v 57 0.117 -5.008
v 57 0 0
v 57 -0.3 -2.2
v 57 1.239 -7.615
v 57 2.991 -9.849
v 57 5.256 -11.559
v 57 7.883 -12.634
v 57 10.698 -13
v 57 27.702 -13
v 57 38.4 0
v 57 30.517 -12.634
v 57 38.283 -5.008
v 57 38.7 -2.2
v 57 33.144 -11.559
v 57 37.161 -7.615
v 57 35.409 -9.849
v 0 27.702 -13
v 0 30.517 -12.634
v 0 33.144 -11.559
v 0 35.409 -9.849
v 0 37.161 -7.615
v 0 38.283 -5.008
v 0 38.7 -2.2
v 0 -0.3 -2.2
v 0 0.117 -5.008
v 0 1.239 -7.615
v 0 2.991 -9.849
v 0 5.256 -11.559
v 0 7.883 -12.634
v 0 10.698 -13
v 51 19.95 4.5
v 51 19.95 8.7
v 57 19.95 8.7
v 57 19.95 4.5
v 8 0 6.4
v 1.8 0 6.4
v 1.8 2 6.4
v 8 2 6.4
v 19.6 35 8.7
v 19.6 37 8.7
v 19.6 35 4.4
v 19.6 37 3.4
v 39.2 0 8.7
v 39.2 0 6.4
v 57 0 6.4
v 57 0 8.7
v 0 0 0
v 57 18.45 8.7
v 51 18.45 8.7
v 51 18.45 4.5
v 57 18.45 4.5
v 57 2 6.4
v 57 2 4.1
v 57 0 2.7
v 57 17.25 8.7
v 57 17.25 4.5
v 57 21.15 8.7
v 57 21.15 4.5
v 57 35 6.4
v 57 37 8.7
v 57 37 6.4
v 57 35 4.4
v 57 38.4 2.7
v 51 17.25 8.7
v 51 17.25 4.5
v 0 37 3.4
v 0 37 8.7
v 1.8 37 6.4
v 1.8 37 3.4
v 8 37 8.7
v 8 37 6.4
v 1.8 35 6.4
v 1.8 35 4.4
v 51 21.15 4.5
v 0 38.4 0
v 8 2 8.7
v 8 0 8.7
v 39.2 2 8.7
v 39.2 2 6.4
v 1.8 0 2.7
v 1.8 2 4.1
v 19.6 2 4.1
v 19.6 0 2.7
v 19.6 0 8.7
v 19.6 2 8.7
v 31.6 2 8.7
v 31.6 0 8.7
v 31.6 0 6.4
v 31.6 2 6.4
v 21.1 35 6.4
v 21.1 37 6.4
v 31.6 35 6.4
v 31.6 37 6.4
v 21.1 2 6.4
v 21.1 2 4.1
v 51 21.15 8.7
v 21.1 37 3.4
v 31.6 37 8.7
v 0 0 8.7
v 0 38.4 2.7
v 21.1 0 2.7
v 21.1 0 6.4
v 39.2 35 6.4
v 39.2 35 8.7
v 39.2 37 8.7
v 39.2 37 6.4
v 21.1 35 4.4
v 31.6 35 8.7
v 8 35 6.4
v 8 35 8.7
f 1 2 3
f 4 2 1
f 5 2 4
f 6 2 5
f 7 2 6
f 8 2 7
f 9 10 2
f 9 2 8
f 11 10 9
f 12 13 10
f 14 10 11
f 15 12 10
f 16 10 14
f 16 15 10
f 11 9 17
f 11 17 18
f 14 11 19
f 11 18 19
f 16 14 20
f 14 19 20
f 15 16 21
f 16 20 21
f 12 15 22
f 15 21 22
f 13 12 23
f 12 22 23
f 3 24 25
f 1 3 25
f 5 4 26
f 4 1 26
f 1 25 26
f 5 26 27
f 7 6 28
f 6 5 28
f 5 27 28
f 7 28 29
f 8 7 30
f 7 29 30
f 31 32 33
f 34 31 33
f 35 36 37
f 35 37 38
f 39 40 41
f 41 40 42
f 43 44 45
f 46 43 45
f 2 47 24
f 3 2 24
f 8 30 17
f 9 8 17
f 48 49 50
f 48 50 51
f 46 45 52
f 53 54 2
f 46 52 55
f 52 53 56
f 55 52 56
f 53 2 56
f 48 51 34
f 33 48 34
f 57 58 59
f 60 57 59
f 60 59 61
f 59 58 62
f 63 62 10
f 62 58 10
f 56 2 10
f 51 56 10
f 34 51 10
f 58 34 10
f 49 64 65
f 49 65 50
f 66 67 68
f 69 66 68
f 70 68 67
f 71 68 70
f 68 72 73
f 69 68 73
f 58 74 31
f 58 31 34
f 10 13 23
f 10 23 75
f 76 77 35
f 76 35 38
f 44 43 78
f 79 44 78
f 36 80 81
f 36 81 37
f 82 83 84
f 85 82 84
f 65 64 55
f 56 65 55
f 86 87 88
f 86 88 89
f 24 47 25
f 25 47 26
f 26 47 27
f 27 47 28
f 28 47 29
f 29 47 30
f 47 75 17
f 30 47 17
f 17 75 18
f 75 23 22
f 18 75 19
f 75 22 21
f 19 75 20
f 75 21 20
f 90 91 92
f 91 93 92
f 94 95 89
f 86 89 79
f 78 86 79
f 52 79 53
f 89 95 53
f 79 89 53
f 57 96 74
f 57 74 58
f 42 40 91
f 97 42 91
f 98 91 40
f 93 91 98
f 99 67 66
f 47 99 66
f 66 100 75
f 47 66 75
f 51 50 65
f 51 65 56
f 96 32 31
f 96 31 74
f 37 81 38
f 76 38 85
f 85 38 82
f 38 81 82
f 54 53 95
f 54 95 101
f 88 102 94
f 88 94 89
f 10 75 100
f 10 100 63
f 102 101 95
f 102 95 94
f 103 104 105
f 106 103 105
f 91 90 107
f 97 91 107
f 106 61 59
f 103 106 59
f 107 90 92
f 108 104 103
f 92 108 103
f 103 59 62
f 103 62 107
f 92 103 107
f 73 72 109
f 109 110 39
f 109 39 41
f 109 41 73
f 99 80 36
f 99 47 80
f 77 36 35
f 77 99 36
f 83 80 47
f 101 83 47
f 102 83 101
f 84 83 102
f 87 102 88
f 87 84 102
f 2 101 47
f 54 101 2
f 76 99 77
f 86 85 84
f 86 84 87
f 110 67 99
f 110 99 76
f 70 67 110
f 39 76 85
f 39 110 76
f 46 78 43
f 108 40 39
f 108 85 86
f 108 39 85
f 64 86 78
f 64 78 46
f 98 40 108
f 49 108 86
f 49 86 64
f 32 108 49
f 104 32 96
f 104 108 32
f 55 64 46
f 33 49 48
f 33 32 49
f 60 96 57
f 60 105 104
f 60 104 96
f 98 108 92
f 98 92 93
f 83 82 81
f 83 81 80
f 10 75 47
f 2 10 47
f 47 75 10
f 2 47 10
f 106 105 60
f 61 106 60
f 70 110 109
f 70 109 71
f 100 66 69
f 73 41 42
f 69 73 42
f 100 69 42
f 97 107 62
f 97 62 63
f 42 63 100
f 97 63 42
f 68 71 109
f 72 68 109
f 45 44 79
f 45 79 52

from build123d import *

# Parameters (mm, degrees)
SKETCH_1_W          = 57
SKETCH_1_H          = 38.4
EXTRUDE_1_DEPTH     = 8.7
SKETCH_2_W          = 57
SKETCH_2_H          = 1.4
CUT_EXTRUDE_1_DEPTH = 2.3
SKETCH_3_W          = 57
SKETCH_3_H          = 2.3
CUT_EXTRUDE_2_DEPTH = 2
SKETCH_4_W          = 11.6
SKETCH_4_H          = 2
SKETCH_4_W_2        = 7.6
CUT_EXTRUDE_3_DEPTH = 2.3
CUT_EXTRUDE_4_DEPTH = 70.276619433
SKETCH_6_W          = 1.5
SKETCH_6_H          = 3.7
SKETCH_6_W_2        = 1.8
EXTRUDE_2_DEPTH     = 2
SKETCH_7_W          = 1.8
SKETCH_7_H          = 3.7
SKETCH_7_W_2        = 1.5
EXTRUDE_3_DEPTH     = 2
SKETCH_10_W         = 6
SKETCH_10_H         = 1.2
CUT_EXTRUDE_5_DEPTH = 4.2
EXTRUDE_4_DEPTH     = 57
FILLET_1_R          = 11


with BuildPart() as part:
    # Эскиз1 → Бобышка-Вытянуть1 (new body)
    with BuildSketch(Plane.XY):
        with Locations((28.5, 19.2)):
            Rectangle(SKETCH_1_W, SKETCH_1_H)
    extrude(amount=EXTRUDE_1_DEPTH)

    # Эскиз2 → Вырез-Вытянуть1 (cut)
    with BuildSketch(Plane.XY.offset(8.7)):
        with Locations((28.5, 37.7)):
            Rectangle(SKETCH_2_W, SKETCH_2_H)
    extrude(amount=-CUT_EXTRUDE_1_DEPTH, mode=Mode.SUBTRACT)

    # Эскиз3 → Вырез-Вытянуть2 (cut)
    with BuildSketch(Plane(origin=(0, 0, 0), x_dir=(1, 0, 0), z_dir=(0, 1, 0))):
        with Locations((28.5, -5.25)):
            Rectangle(SKETCH_3_W, SKETCH_3_H)
    extrude(amount=CUT_EXTRUDE_2_DEPTH, mode=Mode.SUBTRACT)

    # Эскиз4 → Вырез-Вытянуть3 (cut)
    with BuildSketch(Plane.XY.offset(8.7)):
        with Locations((13.8, 1)):
            Rectangle(SKETCH_4_W, SKETCH_4_H)
        with Locations((35.4, 1)):
            Rectangle(SKETCH_4_W_2, SKETCH_4_H)
        with Locations((35.4, 36)):
            Rectangle(SKETCH_4_W_2, SKETCH_4_H)
        with Locations((13.8, 36)):
            Rectangle(SKETCH_4_W, SKETCH_4_H)
    extrude(amount=-CUT_EXTRUDE_3_DEPTH, mode=Mode.SUBTRACT)

    # Эскиз5 → Вырез-Вытянуть4 (cut, through all)
    with BuildSketch(Plane(origin=(57, 0, 0), x_dir=(0, 0, -1), z_dir=(1, 0, 0))):
        Polygon((-4.1, 0), (-4.1, 2), (-2.7, 0), align=None)
        Polygon((-4.4, 35), (-2.7, 38.4), (-6.4, 38.4), (-6.4, 37), (-6.4, 35), align=None)
    extrude(amount=-CUT_EXTRUDE_4_DEPTH, mode=Mode.SUBTRACT)

    # Эскиз6 → Бобышка-Вытянуть2 (add)
    with BuildSketch(Plane.XZ):
        with Locations((20.35, 4.55)):
            Rectangle(SKETCH_6_W, SKETCH_6_H)
        with Locations((0.9, 4.55)):
            Rectangle(SKETCH_6_W_2, SKETCH_6_H)
    extrude(amount=-EXTRUDE_2_DEPTH)

    # Эскиз7 → Бобышка-Вытянуть3 (add)
    with BuildSketch(Plane(origin=(0, 37, 0), x_dir=(1, 0, 0), z_dir=(0, 1, 0))):
        with Locations((0.9, -4.55)):
            Rectangle(SKETCH_7_W, SKETCH_7_H)
        with Locations((20.35, -4.55)):
            Rectangle(SKETCH_7_W_2, SKETCH_7_H)
    extrude(amount=-EXTRUDE_3_DEPTH)

    # Эскиз10 → Вырез-Вытянуть5 (cut)
    with BuildSketch(Plane.XY.offset(8.7)):
        with Locations((54, 20.55)):
            Rectangle(SKETCH_10_W, SKETCH_10_H)
        with Locations((54, 17.85)):
            Rectangle(SKETCH_10_W, SKETCH_10_H)
    extrude(amount=-CUT_EXTRUDE_5_DEPTH, mode=Mode.SUBTRACT)


with BuildPart() as body_2:
    # Эскиз11 → Бобышка-Вытянуть4 (new body)
    with BuildSketch(Plane.ZY):
        Polygon((0, 0), (-2.2, -0.3), (-13, -0.3), (-13, 38.7), (-2.2, 38.7), (0, 38.4), align=None)
    extrude(amount=-EXTRUDE_4_DEPTH)

    # Скругление1
    # the kernel refuses this fillet: 11 mm, written as the material it takes off along each edge
    with BuildSketch(Plane(origin=(-27.49545417, 38.7, -13), x_dir=(0, -1, 0), z_dir=(1, 0, 0))) as fillet_1_piece_1:
        with BuildLine():
            CenterArc((10.998181668, -11), FILLET_1_R, 90, 88.95820115)
            Line((0, -10.8), (-0.219963633, -10.796))
            ThreePointArc((-0.219963633, -10.796), (-0.22, -5.4), (-0.22, 0))
            Line((-0.22, 0), (0, 0.22))
            Line((0, 0.22), (10.998181668, 0.22))
            Line((10.998181668, 0.22), (10.998181668, 0))
        make_face()
    extrude(amount=111.990908339, mode=Mode.SUBTRACT)
    with BuildSketch(Plane(origin=(-27.49545417, -0.3, -13), x_dir=(0, 0, 1), z_dir=(1, 0, 0))) as fillet_1_piece_2:
        with BuildLine():
            CenterArc((11, -10.998181668), FILLET_1_R, 91.04179885, 88.95820115)
            Line((0, -10.998181668), (-0.22, -10.998181668))
            Line((-0.22, -10.998181668), (-0.22, 0))
            Line((-0.22, 0), (0, 0.22))
            ThreePointArc((0, 0.22), (5.4, 0.22), (10.796, 0.219963633))
            Line((10.796, 0.219963633), (10.8, 0))
        make_face()
    extrude(amount=111.990908339, mode=Mode.SUBTRACT)


solid = Compound([part.part, body_2.part])
